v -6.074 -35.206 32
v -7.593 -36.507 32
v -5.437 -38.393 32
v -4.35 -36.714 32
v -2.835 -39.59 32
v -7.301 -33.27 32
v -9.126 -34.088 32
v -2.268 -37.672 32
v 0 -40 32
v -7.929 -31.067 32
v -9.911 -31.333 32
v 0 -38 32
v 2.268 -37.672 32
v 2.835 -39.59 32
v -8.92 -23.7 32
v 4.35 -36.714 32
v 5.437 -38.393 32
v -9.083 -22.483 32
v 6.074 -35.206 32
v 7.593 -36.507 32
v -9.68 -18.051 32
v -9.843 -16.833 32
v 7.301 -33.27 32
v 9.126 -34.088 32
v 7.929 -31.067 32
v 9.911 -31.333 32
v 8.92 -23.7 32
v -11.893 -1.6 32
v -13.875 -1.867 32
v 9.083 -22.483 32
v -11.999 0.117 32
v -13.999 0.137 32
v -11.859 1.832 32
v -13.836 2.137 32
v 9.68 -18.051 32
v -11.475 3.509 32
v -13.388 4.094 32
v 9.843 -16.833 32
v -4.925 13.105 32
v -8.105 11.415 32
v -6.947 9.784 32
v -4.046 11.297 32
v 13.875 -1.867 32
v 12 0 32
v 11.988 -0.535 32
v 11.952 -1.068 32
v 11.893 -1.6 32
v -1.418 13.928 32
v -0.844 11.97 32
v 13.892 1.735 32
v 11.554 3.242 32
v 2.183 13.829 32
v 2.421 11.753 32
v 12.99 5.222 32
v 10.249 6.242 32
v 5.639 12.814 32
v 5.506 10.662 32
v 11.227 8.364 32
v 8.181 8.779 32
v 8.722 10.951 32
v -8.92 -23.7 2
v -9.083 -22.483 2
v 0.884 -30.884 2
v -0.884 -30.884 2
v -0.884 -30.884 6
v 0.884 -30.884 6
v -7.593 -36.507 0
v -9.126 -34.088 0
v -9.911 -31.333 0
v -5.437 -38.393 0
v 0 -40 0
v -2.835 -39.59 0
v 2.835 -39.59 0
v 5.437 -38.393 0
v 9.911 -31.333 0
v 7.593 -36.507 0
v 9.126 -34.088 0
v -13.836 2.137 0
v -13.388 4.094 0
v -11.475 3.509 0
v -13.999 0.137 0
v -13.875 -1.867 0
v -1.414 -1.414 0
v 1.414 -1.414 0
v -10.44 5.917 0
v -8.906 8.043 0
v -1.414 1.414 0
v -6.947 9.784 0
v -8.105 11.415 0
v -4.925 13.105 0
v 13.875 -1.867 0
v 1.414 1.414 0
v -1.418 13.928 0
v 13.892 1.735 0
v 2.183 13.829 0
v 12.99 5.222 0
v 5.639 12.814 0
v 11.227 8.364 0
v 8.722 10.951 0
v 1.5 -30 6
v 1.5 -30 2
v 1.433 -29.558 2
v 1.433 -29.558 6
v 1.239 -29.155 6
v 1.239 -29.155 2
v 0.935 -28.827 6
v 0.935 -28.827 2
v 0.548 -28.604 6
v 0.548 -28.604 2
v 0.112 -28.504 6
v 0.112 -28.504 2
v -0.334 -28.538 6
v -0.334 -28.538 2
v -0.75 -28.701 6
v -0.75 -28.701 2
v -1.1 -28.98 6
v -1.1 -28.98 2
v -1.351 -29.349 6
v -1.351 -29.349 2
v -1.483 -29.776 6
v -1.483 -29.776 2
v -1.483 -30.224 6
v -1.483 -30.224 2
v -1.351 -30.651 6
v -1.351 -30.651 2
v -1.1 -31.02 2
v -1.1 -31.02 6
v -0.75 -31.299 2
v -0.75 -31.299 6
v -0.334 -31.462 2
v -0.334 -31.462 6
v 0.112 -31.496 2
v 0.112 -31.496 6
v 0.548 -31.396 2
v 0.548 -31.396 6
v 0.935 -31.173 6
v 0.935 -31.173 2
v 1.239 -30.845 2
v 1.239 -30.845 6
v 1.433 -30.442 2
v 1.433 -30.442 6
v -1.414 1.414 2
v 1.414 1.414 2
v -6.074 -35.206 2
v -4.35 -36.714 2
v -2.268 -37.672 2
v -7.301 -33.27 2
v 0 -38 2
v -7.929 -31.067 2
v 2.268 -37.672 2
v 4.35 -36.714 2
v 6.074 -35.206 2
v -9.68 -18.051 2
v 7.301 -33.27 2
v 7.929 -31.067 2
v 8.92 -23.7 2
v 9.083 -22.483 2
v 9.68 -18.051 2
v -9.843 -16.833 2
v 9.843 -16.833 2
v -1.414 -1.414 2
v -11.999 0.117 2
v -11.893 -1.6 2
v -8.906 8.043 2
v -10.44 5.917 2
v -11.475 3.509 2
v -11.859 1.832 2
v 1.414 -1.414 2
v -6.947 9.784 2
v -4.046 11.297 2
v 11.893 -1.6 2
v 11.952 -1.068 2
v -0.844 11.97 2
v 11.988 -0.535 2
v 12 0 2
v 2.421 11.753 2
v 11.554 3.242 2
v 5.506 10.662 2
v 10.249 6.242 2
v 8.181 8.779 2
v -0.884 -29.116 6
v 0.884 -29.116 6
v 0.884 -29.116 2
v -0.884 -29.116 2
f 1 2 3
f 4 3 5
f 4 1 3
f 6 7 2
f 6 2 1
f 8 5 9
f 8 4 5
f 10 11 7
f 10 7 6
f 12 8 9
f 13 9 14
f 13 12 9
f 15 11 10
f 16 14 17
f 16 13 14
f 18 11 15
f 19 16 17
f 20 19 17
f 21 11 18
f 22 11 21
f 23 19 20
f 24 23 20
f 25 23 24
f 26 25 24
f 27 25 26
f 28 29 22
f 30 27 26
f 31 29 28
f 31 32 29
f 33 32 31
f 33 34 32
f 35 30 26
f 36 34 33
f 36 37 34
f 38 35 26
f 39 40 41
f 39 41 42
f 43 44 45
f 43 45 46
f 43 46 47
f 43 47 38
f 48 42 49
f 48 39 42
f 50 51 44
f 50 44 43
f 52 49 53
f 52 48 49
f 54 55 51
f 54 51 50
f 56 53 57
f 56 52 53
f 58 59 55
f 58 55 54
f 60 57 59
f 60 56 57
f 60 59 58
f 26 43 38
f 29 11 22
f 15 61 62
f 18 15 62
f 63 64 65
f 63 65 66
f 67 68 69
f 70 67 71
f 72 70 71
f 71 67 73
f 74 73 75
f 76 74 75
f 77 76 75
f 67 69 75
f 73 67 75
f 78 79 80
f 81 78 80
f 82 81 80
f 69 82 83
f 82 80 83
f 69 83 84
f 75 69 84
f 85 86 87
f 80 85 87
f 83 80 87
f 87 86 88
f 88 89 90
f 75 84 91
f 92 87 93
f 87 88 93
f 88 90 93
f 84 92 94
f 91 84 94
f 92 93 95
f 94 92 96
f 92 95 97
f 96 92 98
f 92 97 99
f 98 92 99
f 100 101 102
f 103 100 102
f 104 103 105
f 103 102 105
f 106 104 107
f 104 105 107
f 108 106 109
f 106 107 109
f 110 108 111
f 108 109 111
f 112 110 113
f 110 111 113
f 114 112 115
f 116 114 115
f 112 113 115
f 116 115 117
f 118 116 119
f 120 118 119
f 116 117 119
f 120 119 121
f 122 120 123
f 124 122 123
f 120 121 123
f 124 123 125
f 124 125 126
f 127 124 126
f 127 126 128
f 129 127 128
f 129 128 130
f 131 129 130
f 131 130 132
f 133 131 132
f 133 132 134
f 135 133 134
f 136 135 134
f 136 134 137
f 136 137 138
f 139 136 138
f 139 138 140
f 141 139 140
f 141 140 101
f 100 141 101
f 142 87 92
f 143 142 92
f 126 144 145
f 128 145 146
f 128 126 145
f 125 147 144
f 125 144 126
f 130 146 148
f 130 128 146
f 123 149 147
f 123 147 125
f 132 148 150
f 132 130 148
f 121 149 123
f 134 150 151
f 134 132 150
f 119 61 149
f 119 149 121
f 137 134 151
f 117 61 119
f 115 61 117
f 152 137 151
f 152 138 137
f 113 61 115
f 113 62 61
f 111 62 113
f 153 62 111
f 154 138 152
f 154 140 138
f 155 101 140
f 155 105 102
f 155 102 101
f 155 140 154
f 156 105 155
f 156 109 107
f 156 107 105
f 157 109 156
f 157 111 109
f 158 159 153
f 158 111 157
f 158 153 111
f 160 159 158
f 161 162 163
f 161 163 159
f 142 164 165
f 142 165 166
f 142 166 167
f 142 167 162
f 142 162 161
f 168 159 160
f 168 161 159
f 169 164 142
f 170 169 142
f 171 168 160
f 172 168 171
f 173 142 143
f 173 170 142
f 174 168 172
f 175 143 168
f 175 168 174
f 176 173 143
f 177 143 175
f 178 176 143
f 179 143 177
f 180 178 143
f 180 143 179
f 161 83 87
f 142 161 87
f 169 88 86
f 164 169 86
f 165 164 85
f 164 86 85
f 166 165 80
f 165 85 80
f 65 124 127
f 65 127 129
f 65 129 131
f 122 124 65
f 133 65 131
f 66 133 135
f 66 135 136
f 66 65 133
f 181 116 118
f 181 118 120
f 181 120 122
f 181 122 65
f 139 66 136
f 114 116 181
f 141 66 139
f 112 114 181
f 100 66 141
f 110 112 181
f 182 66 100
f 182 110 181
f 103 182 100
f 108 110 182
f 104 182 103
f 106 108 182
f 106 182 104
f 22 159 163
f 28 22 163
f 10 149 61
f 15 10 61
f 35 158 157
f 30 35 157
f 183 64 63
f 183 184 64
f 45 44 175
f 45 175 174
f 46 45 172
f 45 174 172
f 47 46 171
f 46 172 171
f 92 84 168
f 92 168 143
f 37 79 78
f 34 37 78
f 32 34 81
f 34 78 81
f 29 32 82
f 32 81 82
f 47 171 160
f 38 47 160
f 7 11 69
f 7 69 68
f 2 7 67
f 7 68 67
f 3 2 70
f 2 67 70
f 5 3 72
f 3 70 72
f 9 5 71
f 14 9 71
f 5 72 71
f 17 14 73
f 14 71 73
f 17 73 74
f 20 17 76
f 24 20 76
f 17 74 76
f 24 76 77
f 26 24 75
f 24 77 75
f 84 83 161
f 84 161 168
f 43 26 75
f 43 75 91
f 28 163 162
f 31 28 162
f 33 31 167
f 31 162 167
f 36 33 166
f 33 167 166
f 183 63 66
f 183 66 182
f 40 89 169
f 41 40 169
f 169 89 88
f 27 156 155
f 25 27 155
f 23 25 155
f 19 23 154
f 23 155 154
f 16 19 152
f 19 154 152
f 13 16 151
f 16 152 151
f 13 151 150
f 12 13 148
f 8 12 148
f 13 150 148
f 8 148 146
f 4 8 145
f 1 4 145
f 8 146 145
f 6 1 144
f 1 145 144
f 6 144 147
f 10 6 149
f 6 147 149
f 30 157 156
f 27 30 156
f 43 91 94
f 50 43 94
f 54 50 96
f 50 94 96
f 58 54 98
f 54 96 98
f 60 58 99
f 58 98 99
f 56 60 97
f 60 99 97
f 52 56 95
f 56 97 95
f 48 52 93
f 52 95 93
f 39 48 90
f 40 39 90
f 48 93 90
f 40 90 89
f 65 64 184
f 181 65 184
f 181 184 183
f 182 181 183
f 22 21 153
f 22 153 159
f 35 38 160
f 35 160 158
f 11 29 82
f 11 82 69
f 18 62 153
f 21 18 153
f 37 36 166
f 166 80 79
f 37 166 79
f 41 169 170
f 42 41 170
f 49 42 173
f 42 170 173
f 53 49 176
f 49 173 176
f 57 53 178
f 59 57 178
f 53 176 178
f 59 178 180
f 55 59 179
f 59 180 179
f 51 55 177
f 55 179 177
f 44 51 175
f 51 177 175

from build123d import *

# Parameters (mm, degrees)
F1_DEPTH = 32
F0_R     = 4
F0_R_2   = 4.8981963292
F0_R_3   = 2.949247213
F0_R_4   = 2.5
F0_R_5   = 1.5
F0_W     = 2.8284271247
F0_H     = 2.8284271247
F0_W_2   = 1.767766953
F0_H_2   = 1.767766953
F2_DEPTH = 2
F3_DEPTH = 3
F4_DEPTH = 6


with BuildPart() as f1:
    # F0 (on Top) → F1 (new body)
    with BuildSketch(Plane.XY):
        with BuildLine():
            Line((9.9107124982, -31.3333333333), (13.8749974975, -1.8666666667))
            ThreePointArc((13.8749974975, -1.8666666667), (7.2404165941, 11.9823356464), (-8.1052915892, 11.4150886223))
            Line((-8.1052915892, 11.4150886223), (-6.9473927907, 9.7843616762))
            ThreePointArc((-6.9473927907, 9.7843616762), (5.5059643348, 10.6622866565), (12, 0))
            ThreePointArc((12, 0), (11.9731837866, -0.8017917516), (11.8928549979, -1.6))
            Line((11.8928549979, -1.6), (9.843423449, -16.8334951494))
            Line((9.843423449, -16.8334951494), (9.6796856306, -18.0505639815))
            Line((9.6796856306, -18.0505639815), (9.0834008366, -22.4827693518))
            Line((9.0834008366, -22.4827693518), (8.9196630183, -23.6998381839))
            Line((8.9196630183, -23.6998381839), (7.9285699986, -31.0666666667))
            ThreePointArc((7.9285699986, -31.0666666667), (0, -38), (-7.9285699986, -31.0666666667))
            Line((-7.9285699986, -31.0666666667), (-8.9196630183, -23.6998381839))
            Line((-8.9196630183, -23.6998381839), (-9.0834008366, -22.4827693518))
            Line((-9.0834008366, -22.4827693518), (-9.6796856306, -18.0505639815))
            Line((-9.6796856306, -18.0505639815), (-9.843423449, -16.8334951494))
            Line((-9.843423449, -16.8334951494), (-11.892854985, -1.6000000955))
            ThreePointArc((-11.892854985, -1.6000000955), (-11.9601461079, 0.9771924467), (-11.4754059318, 3.5092817927))
            Line((-11.4754059318, 3.5092817927), (-13.3879735871, 4.0941620915))
            ThreePointArc((-13.3879735871, 4.0941620915), (-13.953503788, 1.1400579105), (-13.8749974975, -1.8666666667))
            Line((-13.8749974975, -1.8666666667), (-9.9107124982, -31.3333333333))
            ThreePointArc((-9.9107124982, -31.3333333333), (0, -40), (9.9107124982, -31.3333333333))
        make_face()
    extrude(amount=F1_DEPTH)

    # F0 (on Top) → F2 (join)
    with BuildSketch(Plane.XY):
        with BuildLine():
            ThreePointArc((12, 0), (5.5059643348, 10.6622866565), (-6.9473927907, 9.7843616762))
            ThreePointArc((-6.9473927907, 9.7843616762), (-9.7310860174, 7.0218206272), (-11.4754059318, 3.5092817927))
            ThreePointArc((-11.4754059318, 3.5092817927), (-11.9601461079, 0.9771924467), (-11.892854985, -1.6000000955))
            ThreePointArc((-11.892854985, -1.6000000955), (4.82e-08, -12), (11.8928549979, -1.6))
            ThreePointArc((11.8928549979, -1.6), (11.9731837866, -0.8017917516), (12, 0))
        make_face()
        Circle(F0_R, mode=Mode.SUBTRACT)
        with BuildLine():
            ThreePointArc((8, -30), (-0.5345278344, -22.0178774756), (-7.9285699986, -31.0666666667))
            ThreePointArc((-7.9285699986, -31.0666666667), (0, -38), (7.9285699986, -31.0666666667))
            ThreePointArc((7.9285699986, -31.0666666667), (7.9821225244, -30.5345278344), (8, -30))
        make_face()
        with Locations((0, -30)):
            Circle(F0_R_2, mode=Mode.SUBTRACT)
        with BuildLine():
            ThreePointArc((11.8928549979, -1.6), (4.82e-08, -12), (-11.892854985, -1.6000000955))
            Line((-11.892854985, -1.6000000955), (-9.843423449, -16.8334951494))
            ThreePointArc((-9.843423449, -16.8334951494), (-3.4351157347, -19.4666666667), (-8.9196630183, -23.6998381839))
            Line((-8.9196630183, -23.6998381839), (-7.9285699986, -31.0666666667))
            ThreePointArc((-7.9285699986, -31.0666666667), (-0.5345278344, -22.0178774756), (8, -30))
            ThreePointArc((8, -30), (7.9821225244, -30.5345278344), (7.9285699986, -31.0666666667))
            Line((7.9285699986, -31.0666666667), (8.9196630183, -23.6998381839))
            ThreePointArc((8.9196630183, -23.6998381839), (3.4351157347, -19.4666666667), (9.843423449, -16.8334951494))
            Line((9.843423449, -16.8334951494), (11.8928549979, -1.6))
        make_face()
        with Locations((0, -30)):
            Circle(F0_R_2)
        with Locations((0, -30)):
            Circle(F0_R_3, mode=Mode.SUBTRACT)
        Circle(F0_R)
        Circle(F0_R_4, mode=Mode.SUBTRACT)
        with Locations((0, -30)):
            Circle(F0_R_3)
        with Locations((0, -30)):
            Circle(F0_R_5, mode=Mode.SUBTRACT)
        with BuildLine():
            ThreePointArc((-9.0834008366, -22.4827693518), (-4.4261869845, -19.6), (-9.6796856306, -18.0505639815))
            Line((-9.6796856306, -18.0505639815), (-9.0834008366, -22.4827693518))
        make_face()
        with BuildLine():
            Line((9.0834008366, -22.4827693518), (9.6796856306, -18.0505639815))
            ThreePointArc((9.6796856306, -18.0505639815), (4.4261869845, -19.6), (9.0834008366, -22.4827693518))
        make_face()
        Circle(F0_R_4)
        Rectangle(F0_W, F0_H, mode=Mode.SUBTRACT)
        with BuildLine():
            Line((9.6796856306, -18.0505639815), (9.843423449, -16.8334951494))
            ThreePointArc((9.843423449, -16.8334951494), (3.4351157347, -19.4666666667), (8.9196630183, -23.6998381839))
            Line((8.9196630183, -23.6998381839), (9.0834008366, -22.4827693518))
            ThreePointArc((9.0834008366, -22.4827693518), (4.4261869845, -19.6), (9.6796856306, -18.0505639815))
        make_face()
        with BuildLine():
            ThreePointArc((-8.9196630183, -23.6998381839), (-3.4351157347, -19.4666666667), (-9.843423449, -16.8334951494))
            Line((-9.843423449, -16.8334951494), (-9.6796856306, -18.0505639815))
            ThreePointArc((-9.6796856306, -18.0505639815), (-4.4261869845, -19.6), (-9.0834008366, -22.4827693518))
            Line((-9.0834008366, -22.4827693518), (-8.9196630183, -23.6998381839))
        make_face()
        Rectangle(F0_W, F0_H)
        with Locations((0, -30)):
            Circle(F0_R_5)
        with Locations((0, -30)):
            Rectangle(F0_W_2, F0_H_2, mode=Mode.SUBTRACT)
        with Locations((0, -30)):
            Rectangle(F0_W_2, F0_H_2)
    extrude(amount=F2_DEPTH)

    # F0 (on Top) → F3 (cut)
    with BuildSketch(Plane.XY):
        Rectangle(F0_W, F0_H)
    extrude(amount=F3_DEPTH, mode=Mode.SUBTRACT)

    # F0 (on Top) → F4 (join)
    with BuildSketch(Plane.XY):
        with Locations((0, -30)):
            Circle(F0_R_5)
        with Locations((0, -30)):
            Rectangle(F0_W_2, F0_H_2, mode=Mode.SUBTRACT)
    extrude(amount=F4_DEPTH)


solid = f1.part
